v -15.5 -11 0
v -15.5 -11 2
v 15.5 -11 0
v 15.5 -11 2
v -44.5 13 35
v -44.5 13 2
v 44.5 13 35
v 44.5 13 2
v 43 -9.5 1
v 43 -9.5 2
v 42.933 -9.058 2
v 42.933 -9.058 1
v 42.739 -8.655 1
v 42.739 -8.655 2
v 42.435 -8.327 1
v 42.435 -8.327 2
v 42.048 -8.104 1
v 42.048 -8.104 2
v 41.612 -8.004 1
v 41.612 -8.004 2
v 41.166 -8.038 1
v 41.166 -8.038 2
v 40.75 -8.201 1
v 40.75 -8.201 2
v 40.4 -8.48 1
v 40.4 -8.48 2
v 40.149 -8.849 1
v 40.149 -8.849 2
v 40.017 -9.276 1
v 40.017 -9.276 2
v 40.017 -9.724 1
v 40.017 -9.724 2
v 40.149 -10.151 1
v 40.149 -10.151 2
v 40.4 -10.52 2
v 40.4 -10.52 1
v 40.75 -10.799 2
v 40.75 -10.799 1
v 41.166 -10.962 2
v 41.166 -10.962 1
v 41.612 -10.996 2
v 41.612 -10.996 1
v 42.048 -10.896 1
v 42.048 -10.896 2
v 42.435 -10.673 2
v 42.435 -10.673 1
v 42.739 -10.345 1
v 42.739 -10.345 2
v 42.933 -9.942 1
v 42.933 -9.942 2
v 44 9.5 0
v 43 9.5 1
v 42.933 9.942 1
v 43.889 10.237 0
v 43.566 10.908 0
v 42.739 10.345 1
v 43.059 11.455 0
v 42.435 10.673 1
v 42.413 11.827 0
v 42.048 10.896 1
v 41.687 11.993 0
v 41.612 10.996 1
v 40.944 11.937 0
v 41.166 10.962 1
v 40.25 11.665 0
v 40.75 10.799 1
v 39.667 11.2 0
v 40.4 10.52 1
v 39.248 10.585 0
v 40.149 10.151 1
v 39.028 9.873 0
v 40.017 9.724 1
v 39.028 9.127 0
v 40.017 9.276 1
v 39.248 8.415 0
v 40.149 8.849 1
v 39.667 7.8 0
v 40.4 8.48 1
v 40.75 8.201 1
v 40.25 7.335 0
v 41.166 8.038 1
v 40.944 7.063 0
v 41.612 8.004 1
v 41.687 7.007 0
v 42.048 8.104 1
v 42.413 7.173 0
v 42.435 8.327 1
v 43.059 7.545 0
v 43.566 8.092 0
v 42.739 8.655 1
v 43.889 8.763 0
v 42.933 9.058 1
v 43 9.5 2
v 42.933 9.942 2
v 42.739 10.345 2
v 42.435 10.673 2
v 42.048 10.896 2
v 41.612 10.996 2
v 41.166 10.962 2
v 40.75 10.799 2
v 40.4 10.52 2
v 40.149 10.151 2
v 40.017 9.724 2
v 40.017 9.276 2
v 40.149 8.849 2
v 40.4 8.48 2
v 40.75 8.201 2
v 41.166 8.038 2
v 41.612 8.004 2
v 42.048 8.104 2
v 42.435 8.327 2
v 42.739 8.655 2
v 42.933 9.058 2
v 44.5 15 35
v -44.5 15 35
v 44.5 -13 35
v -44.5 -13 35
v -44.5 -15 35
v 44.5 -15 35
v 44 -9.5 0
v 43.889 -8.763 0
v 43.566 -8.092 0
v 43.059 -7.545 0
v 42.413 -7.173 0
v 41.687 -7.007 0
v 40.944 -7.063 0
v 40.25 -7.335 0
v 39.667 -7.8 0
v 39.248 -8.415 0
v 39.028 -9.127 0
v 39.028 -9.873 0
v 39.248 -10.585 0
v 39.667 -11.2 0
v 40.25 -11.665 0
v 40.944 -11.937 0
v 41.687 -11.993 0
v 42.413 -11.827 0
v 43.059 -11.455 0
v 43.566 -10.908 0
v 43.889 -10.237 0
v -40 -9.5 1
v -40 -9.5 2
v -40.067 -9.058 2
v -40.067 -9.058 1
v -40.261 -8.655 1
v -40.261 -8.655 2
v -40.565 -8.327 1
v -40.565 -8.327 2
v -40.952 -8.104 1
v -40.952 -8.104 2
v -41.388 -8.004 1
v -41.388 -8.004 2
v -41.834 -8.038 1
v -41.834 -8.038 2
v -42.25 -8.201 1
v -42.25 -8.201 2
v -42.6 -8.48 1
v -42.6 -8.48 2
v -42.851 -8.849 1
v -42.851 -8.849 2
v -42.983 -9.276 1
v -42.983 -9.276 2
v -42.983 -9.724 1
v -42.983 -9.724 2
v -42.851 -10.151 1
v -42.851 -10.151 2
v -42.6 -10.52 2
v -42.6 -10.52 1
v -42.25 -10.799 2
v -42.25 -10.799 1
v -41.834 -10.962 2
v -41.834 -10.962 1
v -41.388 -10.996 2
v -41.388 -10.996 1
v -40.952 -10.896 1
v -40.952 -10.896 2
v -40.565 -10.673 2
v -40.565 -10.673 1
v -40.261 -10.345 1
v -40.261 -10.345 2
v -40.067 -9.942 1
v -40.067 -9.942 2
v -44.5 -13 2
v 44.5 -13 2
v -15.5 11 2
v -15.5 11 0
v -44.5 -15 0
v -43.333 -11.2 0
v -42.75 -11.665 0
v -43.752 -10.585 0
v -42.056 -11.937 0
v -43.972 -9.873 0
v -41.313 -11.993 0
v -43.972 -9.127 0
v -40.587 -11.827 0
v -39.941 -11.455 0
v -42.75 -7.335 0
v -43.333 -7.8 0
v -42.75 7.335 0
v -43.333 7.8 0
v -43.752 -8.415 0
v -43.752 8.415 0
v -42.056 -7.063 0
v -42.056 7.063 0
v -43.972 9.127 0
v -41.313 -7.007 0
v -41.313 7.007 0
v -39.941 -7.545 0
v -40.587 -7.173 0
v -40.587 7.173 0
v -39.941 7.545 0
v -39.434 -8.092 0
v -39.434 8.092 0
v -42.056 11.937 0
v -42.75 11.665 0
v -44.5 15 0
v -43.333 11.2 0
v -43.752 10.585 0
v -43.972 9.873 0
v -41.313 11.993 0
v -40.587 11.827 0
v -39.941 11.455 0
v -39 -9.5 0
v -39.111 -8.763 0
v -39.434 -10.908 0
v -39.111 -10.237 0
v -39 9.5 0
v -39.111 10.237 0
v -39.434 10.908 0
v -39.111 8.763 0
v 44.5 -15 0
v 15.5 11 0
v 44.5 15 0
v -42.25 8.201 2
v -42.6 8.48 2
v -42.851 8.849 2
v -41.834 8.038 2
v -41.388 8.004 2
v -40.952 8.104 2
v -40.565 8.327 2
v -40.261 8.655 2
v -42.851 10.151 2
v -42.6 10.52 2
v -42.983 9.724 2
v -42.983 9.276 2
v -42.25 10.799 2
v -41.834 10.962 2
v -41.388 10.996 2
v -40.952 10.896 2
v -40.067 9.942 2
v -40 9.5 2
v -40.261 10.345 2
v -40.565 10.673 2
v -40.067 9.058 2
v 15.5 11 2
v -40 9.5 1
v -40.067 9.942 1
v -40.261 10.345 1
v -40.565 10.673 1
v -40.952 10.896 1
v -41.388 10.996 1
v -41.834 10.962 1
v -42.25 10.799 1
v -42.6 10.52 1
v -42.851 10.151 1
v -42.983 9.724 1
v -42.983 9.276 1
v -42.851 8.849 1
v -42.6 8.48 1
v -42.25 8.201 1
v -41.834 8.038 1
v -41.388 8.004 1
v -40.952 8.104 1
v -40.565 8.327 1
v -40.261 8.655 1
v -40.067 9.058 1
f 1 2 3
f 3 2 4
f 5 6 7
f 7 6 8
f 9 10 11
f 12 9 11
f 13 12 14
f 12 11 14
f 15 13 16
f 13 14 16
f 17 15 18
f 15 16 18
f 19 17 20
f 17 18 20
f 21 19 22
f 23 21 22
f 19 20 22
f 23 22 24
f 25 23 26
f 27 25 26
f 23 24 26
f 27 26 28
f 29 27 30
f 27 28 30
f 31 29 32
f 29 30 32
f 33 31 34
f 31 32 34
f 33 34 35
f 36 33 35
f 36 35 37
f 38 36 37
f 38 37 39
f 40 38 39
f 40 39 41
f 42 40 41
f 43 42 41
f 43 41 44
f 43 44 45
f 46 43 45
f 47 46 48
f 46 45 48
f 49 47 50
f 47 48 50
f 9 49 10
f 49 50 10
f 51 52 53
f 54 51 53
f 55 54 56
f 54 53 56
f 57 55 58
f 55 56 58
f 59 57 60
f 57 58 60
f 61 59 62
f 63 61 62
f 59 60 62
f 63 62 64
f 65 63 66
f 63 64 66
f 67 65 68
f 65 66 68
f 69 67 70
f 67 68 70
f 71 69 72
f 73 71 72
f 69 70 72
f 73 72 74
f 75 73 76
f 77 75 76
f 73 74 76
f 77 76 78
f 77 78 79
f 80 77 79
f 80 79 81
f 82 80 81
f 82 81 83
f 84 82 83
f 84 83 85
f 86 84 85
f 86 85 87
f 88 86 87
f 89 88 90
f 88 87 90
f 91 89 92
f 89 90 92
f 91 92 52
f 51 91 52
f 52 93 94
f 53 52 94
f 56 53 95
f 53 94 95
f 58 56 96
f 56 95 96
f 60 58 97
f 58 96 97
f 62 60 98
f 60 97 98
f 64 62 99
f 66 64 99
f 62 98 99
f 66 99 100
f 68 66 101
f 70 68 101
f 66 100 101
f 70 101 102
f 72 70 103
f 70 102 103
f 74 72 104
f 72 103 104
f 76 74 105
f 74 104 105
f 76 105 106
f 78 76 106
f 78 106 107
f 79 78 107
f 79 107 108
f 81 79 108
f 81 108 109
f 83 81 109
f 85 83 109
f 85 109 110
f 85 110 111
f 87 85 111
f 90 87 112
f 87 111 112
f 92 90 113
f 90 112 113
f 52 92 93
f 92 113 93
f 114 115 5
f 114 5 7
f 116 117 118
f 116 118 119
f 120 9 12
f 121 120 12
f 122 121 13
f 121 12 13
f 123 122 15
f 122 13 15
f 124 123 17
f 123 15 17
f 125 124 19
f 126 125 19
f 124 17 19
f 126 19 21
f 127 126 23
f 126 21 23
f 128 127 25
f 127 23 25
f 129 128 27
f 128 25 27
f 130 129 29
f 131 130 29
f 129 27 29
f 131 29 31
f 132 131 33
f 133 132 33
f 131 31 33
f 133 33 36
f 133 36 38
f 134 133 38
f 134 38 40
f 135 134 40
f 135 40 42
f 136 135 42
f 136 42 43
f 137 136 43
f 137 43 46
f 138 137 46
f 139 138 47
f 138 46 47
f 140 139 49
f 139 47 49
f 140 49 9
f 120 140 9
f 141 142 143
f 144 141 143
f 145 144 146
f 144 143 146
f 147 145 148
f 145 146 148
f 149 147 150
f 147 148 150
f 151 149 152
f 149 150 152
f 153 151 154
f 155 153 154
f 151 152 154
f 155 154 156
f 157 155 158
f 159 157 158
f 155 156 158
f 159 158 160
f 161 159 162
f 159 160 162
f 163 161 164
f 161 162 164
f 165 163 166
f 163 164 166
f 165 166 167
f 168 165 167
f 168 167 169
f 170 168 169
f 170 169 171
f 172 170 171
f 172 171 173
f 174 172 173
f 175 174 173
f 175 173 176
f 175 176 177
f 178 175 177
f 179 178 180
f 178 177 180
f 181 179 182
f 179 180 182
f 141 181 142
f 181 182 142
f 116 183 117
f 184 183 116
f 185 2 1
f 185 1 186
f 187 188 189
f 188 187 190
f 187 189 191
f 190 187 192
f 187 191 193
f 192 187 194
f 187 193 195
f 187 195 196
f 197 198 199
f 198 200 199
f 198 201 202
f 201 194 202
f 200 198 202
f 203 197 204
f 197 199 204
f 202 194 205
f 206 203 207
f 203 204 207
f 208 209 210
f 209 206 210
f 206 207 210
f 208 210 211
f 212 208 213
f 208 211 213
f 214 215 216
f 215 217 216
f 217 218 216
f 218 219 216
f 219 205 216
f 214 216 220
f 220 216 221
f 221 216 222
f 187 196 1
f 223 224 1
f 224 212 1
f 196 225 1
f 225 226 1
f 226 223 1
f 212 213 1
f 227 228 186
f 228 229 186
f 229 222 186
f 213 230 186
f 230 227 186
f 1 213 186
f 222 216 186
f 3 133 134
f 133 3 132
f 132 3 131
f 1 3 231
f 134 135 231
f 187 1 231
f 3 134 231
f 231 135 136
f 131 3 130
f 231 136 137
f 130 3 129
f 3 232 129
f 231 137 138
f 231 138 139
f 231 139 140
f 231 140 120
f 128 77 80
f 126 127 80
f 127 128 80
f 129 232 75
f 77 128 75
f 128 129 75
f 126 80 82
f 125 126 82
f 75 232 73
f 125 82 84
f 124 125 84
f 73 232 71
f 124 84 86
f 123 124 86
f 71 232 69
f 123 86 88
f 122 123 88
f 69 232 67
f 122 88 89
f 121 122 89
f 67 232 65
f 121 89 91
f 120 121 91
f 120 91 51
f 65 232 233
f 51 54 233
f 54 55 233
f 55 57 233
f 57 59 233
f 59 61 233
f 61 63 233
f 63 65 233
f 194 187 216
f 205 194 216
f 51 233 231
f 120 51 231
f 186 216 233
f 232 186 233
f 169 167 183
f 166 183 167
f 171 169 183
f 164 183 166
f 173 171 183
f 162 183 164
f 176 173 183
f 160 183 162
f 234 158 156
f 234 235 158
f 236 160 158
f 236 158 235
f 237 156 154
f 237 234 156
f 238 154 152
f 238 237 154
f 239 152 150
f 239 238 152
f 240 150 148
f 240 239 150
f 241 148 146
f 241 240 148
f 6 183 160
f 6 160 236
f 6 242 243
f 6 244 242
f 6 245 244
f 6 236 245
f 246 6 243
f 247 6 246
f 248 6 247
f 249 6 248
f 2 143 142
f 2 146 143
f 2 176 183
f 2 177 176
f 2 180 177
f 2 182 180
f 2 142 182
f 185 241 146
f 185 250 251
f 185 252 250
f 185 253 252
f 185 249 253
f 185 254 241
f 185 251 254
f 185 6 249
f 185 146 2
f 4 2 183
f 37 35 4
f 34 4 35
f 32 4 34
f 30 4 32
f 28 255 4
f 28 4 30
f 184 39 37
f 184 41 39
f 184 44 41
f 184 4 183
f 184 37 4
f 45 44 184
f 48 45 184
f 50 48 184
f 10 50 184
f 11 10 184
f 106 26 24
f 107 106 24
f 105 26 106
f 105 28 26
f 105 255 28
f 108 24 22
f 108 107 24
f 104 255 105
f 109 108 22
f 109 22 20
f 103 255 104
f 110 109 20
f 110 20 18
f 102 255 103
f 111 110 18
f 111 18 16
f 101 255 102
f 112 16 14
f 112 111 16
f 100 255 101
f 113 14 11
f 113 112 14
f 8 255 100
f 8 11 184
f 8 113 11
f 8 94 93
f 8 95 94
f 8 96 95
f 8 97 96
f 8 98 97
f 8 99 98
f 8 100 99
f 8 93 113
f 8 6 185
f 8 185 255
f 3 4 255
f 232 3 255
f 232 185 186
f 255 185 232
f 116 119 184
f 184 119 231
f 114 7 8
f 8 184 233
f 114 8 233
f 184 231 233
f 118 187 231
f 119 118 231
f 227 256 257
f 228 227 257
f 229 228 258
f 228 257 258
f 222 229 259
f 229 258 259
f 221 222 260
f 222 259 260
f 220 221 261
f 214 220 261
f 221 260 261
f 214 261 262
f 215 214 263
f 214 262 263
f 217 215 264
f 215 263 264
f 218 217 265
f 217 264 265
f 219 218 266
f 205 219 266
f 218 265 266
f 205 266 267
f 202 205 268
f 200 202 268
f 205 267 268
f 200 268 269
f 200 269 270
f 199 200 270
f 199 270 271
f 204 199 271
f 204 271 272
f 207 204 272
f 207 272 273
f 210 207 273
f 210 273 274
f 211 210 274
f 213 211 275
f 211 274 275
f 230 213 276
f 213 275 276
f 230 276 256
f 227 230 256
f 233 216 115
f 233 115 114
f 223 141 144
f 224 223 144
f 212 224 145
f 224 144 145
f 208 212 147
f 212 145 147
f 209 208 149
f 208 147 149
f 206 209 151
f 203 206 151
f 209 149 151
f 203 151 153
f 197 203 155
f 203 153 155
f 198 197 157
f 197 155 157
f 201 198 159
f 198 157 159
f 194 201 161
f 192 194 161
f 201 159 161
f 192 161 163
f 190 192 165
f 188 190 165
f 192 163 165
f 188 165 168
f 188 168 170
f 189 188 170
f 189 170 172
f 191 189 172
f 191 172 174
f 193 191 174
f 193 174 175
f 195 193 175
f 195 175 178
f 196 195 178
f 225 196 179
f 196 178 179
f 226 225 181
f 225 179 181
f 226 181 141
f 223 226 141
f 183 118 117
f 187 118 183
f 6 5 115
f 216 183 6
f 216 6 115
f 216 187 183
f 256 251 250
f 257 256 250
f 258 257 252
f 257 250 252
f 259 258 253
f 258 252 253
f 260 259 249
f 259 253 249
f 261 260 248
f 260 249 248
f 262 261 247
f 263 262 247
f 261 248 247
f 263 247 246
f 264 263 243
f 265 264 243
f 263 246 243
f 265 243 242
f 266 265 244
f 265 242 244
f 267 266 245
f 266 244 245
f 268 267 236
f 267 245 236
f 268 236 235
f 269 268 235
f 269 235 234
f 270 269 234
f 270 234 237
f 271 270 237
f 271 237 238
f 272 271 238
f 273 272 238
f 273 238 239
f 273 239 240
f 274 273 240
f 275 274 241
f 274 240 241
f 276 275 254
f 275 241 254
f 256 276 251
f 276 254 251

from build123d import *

# Parameters (mm, degrees)
SKETCH_W     = 89
SKETCH_H     = 30
PAD_DEPTH    = 2
SKETCH001_W  = 89
SKETCH001_H  = 2
PAD001_DEPTH = 33
SKETCH002_R  = 1.5
SKETCH002_W  = 31
SKETCH002_H  = 22
POCKET_DEPTH = 2
CHAMFER_SIZE = 1


with BuildPart() as part:
    # Sketch → Pad (new body)
    with BuildSketch(Plane.XY):
        Rectangle(SKETCH_W, SKETCH_H)
    extrude(amount=PAD_DEPTH)

    # Sketch001 (on Face6 of Pad) → Pad001 (join)
    with BuildSketch(Plane.XY.offset(2)):
        with Locations((0, 14)):
            Rectangle(SKETCH001_W, SKETCH001_H)
        with Locations((0, -14)):
            Rectangle(SKETCH001_W, SKETCH001_H)
    extrude(amount=PAD001_DEPTH)

    # Sketch002 (on Face8 of Pad001) → Pocket (cut)
    with BuildSketch(Plane.XY.offset(2)):
        with Locations((41.5, 9.5)):
            Circle(SKETCH002_R)
        with Locations((41.5, -9.5)):
            Circle(SKETCH002_R)
        with Locations((-41.5, -9.5)):
            Circle(SKETCH002_R)
        with Locations((-41.5, 9.5)):
            Circle(SKETCH002_R)
        Rectangle(SKETCH002_W, SKETCH002_H)
    extrude(amount=-POCKET_DEPTH, mode=Mode.SUBTRACT)

    # Chamfer
    chamfer_edges = [part.edges().sort_by_distance(p)[0] for p in [
        (-43, 9.5, 0),
        (-43, -9.5, 0),
        (40, -9.5, 0),
        (40, 9.5, 0),
    ]]
    chamfer(chamfer_edges, length=CHAMFER_SIZE)


solid = part.part
